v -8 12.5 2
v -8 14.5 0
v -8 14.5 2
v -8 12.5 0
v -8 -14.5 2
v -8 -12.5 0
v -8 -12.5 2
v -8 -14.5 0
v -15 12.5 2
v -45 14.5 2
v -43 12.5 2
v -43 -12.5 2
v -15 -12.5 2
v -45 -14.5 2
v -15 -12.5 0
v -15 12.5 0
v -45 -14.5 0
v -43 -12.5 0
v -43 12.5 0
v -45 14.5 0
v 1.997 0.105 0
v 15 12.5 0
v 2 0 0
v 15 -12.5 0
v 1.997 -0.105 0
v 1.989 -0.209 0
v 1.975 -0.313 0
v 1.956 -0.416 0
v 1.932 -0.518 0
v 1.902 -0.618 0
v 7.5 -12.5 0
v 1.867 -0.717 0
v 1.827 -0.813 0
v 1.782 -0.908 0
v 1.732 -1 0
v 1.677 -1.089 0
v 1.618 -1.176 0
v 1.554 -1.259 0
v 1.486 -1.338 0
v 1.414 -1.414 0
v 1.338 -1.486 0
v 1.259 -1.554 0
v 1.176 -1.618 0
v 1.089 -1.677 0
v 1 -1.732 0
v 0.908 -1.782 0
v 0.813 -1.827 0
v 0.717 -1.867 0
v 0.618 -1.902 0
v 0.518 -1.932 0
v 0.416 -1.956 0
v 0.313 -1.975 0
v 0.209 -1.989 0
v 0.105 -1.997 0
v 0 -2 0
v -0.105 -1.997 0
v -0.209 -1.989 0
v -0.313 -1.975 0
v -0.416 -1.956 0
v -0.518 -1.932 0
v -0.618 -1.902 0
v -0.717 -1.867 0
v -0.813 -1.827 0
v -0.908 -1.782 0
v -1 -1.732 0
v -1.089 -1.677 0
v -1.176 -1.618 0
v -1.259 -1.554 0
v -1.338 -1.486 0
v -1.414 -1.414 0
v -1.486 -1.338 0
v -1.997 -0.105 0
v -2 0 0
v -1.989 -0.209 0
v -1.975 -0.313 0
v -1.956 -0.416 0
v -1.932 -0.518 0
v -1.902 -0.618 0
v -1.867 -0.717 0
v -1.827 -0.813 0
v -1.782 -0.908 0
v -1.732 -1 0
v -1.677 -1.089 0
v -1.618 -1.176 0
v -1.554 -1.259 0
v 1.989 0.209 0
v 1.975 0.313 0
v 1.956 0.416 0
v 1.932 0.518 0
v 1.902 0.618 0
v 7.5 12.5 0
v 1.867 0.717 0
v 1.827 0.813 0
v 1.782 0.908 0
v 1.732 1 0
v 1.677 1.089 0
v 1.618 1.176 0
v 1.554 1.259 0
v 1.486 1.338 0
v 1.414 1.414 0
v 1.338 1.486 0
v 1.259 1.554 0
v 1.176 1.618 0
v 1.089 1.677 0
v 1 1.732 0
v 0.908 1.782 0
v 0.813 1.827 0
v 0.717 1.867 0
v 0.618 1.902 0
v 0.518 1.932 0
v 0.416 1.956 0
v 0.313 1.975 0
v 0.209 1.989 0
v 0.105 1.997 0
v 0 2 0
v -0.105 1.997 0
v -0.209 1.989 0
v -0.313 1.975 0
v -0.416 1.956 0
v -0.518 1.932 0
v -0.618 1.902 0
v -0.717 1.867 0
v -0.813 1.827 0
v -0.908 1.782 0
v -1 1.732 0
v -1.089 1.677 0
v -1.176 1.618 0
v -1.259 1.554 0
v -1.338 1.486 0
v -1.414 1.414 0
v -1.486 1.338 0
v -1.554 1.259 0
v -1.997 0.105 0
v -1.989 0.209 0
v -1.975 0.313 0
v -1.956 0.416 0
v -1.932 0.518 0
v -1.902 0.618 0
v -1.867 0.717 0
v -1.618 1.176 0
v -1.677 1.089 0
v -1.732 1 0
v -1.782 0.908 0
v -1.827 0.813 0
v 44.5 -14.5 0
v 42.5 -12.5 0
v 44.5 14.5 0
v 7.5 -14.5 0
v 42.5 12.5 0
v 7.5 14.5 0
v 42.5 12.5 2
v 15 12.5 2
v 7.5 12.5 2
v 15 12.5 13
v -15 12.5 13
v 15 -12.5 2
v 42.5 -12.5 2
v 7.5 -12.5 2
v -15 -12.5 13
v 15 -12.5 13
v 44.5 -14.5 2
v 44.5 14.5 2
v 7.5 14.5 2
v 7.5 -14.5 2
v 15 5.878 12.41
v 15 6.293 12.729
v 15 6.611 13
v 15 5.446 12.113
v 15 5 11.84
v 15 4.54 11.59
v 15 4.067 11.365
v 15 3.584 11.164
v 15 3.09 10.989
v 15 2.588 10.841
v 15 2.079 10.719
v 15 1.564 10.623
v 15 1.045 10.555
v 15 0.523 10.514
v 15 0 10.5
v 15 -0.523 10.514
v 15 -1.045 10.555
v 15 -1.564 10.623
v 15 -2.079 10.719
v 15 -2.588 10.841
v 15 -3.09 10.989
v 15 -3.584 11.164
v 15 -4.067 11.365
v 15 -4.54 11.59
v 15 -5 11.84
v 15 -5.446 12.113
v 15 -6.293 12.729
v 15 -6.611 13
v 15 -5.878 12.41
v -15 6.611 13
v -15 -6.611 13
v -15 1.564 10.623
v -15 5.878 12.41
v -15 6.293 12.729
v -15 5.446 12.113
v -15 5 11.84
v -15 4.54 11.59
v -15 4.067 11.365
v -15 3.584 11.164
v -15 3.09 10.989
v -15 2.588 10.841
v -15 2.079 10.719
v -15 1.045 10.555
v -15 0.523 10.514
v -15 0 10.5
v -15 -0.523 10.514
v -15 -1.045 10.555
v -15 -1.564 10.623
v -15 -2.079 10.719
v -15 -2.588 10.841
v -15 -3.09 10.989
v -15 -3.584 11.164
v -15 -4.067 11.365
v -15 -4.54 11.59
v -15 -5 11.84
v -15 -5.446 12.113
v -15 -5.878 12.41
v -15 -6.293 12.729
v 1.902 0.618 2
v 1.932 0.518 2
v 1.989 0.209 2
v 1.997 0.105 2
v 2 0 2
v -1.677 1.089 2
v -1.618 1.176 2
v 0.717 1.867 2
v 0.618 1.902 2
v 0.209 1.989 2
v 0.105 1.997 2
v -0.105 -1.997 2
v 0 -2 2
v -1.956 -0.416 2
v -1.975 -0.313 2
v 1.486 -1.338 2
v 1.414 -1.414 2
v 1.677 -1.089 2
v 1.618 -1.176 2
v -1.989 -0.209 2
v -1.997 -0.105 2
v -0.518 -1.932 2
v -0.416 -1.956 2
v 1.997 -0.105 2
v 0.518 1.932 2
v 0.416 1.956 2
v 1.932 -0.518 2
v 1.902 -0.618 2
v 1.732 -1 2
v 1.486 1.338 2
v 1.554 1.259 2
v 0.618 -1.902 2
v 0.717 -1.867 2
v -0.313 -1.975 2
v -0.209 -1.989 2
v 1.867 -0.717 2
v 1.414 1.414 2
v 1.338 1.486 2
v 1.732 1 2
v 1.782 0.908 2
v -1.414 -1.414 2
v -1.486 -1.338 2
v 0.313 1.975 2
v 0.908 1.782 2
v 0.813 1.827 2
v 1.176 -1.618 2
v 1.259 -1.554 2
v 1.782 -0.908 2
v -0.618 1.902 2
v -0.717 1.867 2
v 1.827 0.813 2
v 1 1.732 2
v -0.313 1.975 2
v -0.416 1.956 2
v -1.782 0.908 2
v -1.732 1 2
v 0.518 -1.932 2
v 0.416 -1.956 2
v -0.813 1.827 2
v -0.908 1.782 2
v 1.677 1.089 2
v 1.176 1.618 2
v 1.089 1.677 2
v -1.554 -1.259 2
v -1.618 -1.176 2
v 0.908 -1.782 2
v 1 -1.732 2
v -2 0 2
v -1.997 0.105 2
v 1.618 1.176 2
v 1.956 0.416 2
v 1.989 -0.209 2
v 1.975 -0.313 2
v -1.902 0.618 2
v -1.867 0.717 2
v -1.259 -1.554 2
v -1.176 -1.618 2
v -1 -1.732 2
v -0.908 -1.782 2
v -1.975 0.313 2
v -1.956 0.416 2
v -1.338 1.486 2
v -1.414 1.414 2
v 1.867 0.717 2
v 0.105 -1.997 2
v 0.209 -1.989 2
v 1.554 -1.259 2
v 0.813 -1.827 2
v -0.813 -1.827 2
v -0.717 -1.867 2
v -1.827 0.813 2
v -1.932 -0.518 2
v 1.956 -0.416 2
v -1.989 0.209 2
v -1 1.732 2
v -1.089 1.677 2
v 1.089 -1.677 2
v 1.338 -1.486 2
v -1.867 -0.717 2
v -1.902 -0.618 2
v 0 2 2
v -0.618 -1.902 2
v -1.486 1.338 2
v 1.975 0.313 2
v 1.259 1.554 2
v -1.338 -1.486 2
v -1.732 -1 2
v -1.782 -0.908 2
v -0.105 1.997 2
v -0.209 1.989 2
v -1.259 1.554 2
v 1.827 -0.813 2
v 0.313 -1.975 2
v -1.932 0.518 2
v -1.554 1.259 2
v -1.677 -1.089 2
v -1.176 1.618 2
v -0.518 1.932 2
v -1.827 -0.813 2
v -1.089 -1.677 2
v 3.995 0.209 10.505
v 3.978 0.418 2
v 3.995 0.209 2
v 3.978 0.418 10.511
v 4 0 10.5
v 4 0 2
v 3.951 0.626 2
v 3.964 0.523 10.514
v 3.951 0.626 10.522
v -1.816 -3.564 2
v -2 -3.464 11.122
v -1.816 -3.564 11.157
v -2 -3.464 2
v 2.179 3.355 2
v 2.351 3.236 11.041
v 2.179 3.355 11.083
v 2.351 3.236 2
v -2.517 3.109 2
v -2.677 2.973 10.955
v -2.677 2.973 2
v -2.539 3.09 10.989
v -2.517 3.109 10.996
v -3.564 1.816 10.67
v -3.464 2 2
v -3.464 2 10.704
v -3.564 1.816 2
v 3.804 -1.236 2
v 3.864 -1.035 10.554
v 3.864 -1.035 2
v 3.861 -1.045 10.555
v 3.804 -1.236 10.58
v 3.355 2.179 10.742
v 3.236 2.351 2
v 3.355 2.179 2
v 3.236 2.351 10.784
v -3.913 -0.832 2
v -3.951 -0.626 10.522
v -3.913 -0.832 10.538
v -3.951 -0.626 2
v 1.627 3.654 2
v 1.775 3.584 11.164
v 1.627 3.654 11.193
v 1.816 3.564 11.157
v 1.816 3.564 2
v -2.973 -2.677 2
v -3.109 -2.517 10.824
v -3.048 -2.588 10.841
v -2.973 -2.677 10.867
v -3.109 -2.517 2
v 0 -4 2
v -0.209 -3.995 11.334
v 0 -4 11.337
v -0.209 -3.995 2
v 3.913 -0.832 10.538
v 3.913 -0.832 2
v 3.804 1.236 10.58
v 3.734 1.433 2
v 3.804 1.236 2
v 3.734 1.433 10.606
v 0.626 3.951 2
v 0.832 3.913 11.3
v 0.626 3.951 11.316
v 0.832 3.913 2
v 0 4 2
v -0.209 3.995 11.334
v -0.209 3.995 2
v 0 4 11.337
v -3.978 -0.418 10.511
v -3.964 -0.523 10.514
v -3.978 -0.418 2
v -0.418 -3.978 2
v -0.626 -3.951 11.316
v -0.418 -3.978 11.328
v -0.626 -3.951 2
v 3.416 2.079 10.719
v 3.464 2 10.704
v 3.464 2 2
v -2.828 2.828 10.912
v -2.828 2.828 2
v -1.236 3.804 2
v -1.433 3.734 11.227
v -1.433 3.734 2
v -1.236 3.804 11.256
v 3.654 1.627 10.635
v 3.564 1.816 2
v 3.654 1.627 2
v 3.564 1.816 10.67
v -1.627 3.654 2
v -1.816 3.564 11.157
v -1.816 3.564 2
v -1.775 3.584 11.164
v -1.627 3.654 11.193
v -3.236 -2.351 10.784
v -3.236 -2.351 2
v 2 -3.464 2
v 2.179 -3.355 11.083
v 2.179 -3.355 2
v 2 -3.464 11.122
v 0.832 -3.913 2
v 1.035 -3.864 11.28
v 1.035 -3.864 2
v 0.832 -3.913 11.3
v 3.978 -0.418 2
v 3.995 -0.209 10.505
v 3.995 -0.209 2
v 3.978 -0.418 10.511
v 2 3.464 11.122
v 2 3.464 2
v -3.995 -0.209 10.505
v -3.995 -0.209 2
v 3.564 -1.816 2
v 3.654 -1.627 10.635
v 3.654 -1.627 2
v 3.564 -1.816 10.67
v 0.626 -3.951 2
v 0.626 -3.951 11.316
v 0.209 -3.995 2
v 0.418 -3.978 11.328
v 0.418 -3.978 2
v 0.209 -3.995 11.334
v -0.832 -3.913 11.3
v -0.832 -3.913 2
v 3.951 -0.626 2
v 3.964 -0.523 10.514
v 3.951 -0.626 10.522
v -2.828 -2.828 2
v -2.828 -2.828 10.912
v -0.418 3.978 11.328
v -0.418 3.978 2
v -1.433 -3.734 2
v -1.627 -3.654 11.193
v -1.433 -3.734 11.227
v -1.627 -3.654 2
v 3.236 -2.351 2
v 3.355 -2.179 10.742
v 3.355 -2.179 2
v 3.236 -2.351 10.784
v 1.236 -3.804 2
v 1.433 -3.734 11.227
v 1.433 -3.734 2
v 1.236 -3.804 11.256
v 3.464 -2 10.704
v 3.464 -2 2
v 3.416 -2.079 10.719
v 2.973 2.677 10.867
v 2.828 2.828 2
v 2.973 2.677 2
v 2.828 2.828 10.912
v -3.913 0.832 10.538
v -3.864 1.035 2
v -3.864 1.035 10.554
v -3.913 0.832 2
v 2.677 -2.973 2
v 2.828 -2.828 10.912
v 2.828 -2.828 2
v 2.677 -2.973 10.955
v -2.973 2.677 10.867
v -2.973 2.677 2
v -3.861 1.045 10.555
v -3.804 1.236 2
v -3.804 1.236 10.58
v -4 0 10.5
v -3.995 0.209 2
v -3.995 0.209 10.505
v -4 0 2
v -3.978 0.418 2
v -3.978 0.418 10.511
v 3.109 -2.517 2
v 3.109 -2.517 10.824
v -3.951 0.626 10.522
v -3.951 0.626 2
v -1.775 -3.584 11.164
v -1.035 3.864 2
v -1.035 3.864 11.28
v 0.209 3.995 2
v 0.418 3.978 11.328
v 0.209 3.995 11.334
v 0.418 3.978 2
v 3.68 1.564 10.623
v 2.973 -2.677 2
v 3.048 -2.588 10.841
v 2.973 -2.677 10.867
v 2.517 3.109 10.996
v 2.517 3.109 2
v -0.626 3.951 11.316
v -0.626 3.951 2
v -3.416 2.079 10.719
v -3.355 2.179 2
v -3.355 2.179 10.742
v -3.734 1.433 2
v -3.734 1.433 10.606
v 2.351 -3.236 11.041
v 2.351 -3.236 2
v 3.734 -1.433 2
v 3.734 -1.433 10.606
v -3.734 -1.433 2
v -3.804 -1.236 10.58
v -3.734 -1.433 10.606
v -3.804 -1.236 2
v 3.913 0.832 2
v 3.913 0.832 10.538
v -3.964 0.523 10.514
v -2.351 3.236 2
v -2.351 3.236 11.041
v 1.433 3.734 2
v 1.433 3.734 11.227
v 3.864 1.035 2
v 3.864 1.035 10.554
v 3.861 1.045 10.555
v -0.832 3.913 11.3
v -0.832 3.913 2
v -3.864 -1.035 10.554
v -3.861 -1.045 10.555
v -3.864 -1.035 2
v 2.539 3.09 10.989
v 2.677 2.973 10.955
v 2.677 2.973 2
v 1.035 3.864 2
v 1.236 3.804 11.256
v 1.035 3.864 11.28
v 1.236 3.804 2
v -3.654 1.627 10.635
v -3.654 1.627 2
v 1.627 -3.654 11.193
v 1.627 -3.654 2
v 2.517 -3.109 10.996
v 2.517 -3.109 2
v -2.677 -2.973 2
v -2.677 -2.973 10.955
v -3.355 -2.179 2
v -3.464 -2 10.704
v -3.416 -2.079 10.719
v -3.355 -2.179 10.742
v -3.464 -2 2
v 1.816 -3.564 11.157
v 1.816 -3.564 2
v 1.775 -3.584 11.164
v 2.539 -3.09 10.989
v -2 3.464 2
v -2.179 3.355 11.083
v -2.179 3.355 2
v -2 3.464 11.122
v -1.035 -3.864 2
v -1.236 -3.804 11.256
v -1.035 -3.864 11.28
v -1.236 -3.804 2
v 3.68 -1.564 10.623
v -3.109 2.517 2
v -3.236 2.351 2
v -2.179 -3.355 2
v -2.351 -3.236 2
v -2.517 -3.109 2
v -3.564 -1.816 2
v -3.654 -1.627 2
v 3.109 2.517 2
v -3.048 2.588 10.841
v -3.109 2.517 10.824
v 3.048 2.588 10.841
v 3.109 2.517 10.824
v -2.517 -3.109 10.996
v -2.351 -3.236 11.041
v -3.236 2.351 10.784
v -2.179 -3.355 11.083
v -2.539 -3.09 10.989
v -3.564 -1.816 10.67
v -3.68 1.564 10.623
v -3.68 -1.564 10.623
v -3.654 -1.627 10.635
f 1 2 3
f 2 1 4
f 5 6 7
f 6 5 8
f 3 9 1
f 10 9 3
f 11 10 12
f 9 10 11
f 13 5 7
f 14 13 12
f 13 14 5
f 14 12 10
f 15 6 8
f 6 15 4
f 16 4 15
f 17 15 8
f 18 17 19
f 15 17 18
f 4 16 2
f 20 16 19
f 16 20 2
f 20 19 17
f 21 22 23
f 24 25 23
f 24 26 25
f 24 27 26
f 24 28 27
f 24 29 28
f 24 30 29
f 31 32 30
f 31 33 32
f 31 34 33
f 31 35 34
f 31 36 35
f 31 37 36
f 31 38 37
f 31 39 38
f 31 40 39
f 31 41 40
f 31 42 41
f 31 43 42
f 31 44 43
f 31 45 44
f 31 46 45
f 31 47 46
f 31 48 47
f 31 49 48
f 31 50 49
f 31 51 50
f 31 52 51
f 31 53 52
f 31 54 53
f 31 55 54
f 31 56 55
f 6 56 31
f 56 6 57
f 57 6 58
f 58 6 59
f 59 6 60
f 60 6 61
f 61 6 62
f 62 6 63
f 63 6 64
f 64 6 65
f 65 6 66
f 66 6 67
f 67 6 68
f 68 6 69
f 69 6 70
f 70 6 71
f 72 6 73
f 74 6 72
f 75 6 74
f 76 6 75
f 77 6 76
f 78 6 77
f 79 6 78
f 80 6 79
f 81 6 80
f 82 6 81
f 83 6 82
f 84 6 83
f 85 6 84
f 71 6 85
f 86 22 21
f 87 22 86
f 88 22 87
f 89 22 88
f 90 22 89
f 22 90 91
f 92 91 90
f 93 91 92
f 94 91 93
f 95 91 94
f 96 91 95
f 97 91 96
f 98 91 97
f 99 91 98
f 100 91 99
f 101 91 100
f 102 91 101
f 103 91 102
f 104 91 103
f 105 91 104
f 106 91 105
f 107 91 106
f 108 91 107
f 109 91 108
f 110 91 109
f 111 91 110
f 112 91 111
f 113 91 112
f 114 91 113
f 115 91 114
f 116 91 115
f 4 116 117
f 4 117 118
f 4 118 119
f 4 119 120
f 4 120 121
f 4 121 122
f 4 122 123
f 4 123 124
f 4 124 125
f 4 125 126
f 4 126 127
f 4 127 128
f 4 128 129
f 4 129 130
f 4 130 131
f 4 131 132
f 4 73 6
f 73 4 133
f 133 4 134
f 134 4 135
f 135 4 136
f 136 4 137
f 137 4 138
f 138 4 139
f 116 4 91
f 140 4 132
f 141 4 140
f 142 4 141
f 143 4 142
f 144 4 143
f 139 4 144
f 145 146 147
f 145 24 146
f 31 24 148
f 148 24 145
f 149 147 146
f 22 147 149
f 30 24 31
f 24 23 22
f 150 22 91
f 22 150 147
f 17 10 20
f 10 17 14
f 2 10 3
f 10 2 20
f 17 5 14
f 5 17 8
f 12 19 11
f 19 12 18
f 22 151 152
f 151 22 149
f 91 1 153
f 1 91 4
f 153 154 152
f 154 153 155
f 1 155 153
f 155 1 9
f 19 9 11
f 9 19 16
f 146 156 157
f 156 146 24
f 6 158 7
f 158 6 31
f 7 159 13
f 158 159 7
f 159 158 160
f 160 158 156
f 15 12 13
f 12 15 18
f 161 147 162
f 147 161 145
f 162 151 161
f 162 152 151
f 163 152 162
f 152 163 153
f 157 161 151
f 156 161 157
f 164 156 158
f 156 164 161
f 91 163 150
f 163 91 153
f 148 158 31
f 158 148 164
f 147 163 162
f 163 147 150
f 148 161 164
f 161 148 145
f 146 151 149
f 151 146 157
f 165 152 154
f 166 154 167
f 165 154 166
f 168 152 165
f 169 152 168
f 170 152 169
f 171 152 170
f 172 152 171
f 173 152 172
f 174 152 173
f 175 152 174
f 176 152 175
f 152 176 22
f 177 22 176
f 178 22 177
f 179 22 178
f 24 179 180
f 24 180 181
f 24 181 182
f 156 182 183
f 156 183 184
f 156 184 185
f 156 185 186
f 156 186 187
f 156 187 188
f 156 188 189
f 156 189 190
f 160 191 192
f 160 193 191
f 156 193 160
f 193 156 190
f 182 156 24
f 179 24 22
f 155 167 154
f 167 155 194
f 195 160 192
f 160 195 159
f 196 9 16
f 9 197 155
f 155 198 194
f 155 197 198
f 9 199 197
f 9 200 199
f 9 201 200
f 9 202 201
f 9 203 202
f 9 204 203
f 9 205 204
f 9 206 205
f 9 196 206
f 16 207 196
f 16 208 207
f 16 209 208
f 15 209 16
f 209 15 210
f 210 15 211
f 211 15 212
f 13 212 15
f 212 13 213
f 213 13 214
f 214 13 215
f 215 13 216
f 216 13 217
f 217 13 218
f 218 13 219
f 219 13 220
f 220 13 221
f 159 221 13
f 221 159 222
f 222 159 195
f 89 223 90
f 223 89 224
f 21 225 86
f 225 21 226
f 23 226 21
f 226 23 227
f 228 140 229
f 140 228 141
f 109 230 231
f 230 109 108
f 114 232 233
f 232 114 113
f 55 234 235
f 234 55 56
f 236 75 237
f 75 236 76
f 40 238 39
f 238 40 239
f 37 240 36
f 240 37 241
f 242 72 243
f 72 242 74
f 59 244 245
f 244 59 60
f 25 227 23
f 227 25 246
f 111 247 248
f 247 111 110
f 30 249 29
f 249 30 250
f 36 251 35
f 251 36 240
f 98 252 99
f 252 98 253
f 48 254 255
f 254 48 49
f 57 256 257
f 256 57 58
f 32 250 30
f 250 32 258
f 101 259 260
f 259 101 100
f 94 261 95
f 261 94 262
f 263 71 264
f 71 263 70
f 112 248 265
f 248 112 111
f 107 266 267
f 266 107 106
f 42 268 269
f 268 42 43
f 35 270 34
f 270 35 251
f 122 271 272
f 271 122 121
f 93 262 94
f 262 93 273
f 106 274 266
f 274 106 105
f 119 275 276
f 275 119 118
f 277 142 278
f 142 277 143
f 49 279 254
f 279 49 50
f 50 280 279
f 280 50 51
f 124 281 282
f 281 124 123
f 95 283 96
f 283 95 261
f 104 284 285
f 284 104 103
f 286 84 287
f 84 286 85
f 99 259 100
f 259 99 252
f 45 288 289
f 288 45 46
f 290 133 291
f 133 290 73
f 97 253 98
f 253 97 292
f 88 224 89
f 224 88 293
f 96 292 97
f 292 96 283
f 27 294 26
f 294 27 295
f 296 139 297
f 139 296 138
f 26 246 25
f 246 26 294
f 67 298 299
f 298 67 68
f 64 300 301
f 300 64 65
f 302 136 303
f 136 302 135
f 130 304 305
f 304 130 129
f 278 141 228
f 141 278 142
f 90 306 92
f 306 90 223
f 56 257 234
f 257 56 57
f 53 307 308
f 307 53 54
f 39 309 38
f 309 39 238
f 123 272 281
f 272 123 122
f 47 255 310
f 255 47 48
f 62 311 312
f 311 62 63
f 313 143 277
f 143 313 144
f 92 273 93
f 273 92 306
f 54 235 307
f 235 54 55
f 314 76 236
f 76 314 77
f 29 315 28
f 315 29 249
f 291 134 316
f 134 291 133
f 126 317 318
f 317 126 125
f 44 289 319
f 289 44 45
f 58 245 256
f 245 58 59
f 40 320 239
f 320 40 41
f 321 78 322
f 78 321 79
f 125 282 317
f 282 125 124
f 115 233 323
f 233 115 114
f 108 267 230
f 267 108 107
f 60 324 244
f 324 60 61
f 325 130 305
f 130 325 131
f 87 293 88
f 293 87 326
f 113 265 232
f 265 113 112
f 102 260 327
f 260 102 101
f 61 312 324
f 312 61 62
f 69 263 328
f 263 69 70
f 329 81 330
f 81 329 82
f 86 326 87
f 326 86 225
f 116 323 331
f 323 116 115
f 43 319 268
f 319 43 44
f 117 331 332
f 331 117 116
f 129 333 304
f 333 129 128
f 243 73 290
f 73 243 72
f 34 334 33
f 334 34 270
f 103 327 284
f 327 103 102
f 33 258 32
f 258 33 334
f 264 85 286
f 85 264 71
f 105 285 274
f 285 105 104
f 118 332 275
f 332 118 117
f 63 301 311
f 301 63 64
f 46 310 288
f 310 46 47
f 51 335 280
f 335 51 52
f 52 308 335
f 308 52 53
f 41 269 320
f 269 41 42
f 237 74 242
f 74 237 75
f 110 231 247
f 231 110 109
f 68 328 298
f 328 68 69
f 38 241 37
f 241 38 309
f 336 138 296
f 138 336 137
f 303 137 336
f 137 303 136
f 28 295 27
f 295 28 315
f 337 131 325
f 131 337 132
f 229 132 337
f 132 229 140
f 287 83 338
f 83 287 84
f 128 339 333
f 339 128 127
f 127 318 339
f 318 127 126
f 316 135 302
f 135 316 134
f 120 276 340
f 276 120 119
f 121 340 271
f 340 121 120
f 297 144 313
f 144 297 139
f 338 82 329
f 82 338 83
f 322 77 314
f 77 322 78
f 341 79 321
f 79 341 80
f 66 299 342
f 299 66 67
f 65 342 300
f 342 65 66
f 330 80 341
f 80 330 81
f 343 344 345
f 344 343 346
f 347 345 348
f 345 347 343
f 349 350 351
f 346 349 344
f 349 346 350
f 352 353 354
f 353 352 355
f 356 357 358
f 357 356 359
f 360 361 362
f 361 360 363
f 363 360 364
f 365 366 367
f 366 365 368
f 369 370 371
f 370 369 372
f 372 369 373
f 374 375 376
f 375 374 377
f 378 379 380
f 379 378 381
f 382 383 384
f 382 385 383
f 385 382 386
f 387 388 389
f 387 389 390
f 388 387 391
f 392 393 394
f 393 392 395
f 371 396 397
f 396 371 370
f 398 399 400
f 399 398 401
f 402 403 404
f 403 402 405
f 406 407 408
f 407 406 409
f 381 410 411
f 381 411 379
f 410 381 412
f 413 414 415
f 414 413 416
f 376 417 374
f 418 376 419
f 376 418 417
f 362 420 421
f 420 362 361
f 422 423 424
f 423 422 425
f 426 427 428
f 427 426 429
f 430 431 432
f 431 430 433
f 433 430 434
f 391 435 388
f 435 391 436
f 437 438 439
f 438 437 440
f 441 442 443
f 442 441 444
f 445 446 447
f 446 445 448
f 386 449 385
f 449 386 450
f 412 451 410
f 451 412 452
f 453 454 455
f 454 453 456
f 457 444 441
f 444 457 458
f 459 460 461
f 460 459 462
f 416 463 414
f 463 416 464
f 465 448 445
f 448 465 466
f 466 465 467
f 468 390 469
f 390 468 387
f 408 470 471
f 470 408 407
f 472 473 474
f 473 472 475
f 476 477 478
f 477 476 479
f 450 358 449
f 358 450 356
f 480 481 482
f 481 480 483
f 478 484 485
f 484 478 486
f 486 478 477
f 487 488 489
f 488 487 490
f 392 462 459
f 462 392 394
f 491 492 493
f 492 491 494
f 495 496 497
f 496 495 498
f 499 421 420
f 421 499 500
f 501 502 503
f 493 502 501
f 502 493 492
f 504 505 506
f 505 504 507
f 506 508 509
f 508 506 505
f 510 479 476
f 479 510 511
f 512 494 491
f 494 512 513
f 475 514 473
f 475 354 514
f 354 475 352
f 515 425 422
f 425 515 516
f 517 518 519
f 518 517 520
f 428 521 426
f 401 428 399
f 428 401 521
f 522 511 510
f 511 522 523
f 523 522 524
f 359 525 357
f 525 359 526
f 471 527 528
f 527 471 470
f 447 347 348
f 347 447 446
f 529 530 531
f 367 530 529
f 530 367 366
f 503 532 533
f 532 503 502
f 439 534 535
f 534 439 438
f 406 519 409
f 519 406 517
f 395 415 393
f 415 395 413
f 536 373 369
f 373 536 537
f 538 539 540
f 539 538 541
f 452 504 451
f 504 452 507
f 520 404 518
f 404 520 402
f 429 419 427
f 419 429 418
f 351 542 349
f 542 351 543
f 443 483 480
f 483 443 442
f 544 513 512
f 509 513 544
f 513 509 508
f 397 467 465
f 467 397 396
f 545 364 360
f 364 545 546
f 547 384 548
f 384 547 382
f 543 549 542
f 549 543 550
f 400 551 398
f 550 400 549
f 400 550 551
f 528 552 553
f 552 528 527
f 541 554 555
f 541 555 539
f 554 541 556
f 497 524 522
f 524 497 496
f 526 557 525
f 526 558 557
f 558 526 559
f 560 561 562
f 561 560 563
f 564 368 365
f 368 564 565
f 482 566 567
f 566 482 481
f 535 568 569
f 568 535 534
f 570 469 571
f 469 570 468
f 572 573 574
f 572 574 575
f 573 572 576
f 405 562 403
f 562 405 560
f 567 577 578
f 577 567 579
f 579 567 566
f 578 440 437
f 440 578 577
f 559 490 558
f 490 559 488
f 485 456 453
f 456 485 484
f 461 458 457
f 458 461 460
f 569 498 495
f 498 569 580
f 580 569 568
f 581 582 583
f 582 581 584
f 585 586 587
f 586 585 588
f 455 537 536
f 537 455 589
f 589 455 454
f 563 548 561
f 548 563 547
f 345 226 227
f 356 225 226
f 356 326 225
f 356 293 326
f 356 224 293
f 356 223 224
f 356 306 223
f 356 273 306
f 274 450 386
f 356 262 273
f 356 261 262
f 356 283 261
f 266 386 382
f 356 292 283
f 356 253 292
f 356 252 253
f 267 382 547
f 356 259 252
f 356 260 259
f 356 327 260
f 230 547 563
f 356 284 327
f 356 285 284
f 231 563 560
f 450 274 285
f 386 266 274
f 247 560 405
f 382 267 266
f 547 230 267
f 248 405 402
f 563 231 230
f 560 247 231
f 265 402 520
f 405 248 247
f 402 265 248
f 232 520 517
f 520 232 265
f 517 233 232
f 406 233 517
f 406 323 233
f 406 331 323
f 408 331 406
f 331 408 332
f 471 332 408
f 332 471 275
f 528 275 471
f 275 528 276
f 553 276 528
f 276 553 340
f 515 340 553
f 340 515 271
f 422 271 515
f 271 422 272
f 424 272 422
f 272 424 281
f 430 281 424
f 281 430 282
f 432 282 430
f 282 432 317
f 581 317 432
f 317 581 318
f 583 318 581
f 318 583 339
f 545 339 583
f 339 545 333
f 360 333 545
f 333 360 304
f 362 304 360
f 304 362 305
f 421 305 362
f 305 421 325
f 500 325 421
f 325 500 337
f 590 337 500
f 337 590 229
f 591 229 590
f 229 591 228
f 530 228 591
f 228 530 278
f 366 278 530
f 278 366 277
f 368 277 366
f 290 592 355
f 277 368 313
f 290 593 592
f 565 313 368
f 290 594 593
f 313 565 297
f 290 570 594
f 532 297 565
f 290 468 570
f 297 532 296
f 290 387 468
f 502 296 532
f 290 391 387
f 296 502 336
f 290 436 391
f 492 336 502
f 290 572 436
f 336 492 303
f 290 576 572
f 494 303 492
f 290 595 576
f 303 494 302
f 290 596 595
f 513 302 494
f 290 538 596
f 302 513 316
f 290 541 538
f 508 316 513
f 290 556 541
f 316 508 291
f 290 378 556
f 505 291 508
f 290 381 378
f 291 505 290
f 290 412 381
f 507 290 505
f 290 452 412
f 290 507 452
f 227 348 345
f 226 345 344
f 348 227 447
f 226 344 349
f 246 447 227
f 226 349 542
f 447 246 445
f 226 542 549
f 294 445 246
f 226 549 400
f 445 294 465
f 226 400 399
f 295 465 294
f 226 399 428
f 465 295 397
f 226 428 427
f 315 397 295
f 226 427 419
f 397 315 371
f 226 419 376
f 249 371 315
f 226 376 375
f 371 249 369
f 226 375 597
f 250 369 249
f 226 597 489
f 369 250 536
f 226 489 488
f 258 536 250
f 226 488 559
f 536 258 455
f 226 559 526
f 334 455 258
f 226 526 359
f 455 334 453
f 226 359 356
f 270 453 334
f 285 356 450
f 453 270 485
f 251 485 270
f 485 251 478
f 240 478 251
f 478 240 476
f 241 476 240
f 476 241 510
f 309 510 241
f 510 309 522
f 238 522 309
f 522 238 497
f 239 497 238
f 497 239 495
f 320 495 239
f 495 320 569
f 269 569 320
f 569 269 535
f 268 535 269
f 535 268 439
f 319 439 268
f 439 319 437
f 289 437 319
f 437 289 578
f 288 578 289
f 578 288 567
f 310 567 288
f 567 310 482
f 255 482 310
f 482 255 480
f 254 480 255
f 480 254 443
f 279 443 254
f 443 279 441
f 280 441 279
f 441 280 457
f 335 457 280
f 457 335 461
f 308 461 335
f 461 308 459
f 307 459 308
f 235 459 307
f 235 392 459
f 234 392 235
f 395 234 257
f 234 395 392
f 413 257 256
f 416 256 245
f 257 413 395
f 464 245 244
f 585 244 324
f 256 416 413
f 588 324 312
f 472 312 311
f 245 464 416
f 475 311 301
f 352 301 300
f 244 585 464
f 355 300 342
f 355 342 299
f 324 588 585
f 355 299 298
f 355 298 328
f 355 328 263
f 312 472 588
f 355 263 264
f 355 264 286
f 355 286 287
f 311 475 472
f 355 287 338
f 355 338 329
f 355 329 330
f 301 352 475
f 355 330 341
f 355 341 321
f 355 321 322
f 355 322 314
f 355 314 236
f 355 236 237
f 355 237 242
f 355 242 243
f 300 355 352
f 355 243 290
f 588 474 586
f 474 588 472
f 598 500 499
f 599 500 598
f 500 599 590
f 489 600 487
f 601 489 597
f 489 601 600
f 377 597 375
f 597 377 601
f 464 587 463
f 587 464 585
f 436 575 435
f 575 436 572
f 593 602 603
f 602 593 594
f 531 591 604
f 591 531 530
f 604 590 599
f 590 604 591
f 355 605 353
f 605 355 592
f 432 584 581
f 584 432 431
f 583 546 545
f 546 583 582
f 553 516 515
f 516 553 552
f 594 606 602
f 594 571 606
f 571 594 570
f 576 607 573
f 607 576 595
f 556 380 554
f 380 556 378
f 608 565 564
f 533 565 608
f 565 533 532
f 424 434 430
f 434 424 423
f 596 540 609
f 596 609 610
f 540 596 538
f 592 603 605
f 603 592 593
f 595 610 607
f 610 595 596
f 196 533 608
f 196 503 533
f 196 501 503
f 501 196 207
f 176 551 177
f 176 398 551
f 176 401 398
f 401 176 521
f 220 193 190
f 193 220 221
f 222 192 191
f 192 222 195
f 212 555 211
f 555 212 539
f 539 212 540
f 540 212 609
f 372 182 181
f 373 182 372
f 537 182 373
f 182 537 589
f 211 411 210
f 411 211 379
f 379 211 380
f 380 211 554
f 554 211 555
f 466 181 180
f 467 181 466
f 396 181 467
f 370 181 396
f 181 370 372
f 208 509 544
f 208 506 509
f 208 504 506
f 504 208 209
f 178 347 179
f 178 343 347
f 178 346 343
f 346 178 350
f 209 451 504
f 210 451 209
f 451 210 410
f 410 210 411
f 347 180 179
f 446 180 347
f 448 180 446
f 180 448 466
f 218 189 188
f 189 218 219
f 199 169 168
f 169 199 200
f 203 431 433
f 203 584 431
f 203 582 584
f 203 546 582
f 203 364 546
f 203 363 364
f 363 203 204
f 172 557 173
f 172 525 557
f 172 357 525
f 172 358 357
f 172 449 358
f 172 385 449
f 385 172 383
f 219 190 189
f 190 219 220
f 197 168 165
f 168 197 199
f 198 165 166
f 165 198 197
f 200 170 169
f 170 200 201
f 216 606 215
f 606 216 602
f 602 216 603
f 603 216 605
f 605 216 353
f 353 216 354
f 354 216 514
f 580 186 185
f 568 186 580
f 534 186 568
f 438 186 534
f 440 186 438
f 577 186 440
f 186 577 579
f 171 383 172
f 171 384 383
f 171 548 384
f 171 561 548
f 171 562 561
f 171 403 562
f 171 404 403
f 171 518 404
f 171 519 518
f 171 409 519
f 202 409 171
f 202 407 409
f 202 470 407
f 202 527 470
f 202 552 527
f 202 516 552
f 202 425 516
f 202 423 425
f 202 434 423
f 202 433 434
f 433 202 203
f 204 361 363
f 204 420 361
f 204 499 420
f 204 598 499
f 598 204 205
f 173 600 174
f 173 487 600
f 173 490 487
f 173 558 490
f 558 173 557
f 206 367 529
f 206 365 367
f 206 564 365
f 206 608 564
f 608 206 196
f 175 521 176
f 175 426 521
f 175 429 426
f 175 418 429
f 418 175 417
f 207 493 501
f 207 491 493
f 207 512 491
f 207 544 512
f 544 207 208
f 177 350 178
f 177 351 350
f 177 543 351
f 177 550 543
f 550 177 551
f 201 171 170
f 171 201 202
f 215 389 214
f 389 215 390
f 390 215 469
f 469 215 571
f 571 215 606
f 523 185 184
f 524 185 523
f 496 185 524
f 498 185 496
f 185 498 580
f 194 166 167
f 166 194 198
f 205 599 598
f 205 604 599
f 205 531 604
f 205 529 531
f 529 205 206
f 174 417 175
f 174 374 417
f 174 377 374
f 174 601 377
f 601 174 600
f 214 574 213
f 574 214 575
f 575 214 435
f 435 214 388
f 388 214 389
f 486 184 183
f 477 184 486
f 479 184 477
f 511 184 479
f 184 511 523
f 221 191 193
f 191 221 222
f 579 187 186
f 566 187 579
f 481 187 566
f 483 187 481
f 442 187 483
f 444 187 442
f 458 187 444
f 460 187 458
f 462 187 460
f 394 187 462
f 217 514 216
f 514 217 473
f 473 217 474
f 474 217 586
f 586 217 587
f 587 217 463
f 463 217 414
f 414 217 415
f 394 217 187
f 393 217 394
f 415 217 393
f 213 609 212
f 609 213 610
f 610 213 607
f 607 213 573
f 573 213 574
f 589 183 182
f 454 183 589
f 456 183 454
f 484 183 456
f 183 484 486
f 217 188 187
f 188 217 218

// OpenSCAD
// file: vars.scad
baseRDia = 31.8;
itemRDia = 20;
blockL = 30;
blockW = 25;
slingH = 2;
slingW = 4;
screwDia = 4;
screwLength = 20;
screwHeadHeight = 4;
screwWasherDia = 8;
screwWasherHeight = 1;
screwHoleLeft = 2;
screwSpaceLeft = 2;

//constant
pi = 3.14;

//config
$fn = 120;

//math
baseCirc = baseRDia/2*pi;
itemCirc = itemRDia/2*pi;
screwHeight = screwHeadHeight+screwWasherHeight+screwSpaceLeft;
blockH = slingH*2+screwHeight+screwHoleLeft;
// main file
include <vars.scad>;

//item
module itemR(){
  translate([-(blockL+blockW)/2,0,blockH+itemRDia/2-itemRDia/8]){
    rotate([0,90,0]){
      cylinder(d=itemRDia,h=blockL+blockW);
    }
  }
}

//adapt
module adaptSling(blockL,blockW,blockH){
  translate([-blockL/2,-blockW/2,0]){
    cube([blockL,blockW,blockH]);
    translate([-blockL,-slingW/2,0]){
      difference(){
        cube([blockH+itemRDia+slingW,blockW+slingW,slingH]);
        translate([slingW/2,slingW/2,-1]){
          cube([blockH+itemRDia,blockW,slingH+2]);
        }
      }
    }
    translate([blockL/2+blockL/4,-slingW/2,0]){
      difference(){
        cube([blockH+itemRDia+slingW,blockW+slingW,slingH]);
        translate([slingW/2,slingW/2,-1]){
          cube([blockH+itemRDia,blockW,slingH+2]);
        }
      }
    }
  }
}
//hole
module screwHole(screwDia,screwLength,screwHeadHeight,screwWasherDia,screwWasherHeight,screwHoleLeft){
  translate([0,0,-2]){
    cylinder(d=screwDia,h=baseRDia+blockH*2);
  }
  translate([0,0,screwHoleLeft]){
    cylinder(d=screwWasherDia,h=baseRDia/2+screwHeight-screwHoleLeft);
  }
}

difference(){
  adaptSling(blockL,blockW,blockH);
  itemR();
  screwHole(screwDia,screwLength,screwHeadHeight,screwWasherDia,screwWasherHeight,screwHoleLeft);

}
